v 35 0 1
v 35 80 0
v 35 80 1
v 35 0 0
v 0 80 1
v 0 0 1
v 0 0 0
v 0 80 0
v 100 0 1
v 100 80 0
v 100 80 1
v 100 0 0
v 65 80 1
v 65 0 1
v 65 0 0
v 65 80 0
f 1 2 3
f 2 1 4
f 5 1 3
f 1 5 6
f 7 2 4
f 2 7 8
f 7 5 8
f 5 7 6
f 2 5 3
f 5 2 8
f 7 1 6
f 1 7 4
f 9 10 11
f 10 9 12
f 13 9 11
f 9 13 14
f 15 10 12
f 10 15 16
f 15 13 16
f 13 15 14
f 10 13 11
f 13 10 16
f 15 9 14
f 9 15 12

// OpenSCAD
translate([0, 0, 0]) {
 cube([35, 80, 1]); 
}translate([65, 0, 0]) {
 cube([35, 80, 1]); 
}
